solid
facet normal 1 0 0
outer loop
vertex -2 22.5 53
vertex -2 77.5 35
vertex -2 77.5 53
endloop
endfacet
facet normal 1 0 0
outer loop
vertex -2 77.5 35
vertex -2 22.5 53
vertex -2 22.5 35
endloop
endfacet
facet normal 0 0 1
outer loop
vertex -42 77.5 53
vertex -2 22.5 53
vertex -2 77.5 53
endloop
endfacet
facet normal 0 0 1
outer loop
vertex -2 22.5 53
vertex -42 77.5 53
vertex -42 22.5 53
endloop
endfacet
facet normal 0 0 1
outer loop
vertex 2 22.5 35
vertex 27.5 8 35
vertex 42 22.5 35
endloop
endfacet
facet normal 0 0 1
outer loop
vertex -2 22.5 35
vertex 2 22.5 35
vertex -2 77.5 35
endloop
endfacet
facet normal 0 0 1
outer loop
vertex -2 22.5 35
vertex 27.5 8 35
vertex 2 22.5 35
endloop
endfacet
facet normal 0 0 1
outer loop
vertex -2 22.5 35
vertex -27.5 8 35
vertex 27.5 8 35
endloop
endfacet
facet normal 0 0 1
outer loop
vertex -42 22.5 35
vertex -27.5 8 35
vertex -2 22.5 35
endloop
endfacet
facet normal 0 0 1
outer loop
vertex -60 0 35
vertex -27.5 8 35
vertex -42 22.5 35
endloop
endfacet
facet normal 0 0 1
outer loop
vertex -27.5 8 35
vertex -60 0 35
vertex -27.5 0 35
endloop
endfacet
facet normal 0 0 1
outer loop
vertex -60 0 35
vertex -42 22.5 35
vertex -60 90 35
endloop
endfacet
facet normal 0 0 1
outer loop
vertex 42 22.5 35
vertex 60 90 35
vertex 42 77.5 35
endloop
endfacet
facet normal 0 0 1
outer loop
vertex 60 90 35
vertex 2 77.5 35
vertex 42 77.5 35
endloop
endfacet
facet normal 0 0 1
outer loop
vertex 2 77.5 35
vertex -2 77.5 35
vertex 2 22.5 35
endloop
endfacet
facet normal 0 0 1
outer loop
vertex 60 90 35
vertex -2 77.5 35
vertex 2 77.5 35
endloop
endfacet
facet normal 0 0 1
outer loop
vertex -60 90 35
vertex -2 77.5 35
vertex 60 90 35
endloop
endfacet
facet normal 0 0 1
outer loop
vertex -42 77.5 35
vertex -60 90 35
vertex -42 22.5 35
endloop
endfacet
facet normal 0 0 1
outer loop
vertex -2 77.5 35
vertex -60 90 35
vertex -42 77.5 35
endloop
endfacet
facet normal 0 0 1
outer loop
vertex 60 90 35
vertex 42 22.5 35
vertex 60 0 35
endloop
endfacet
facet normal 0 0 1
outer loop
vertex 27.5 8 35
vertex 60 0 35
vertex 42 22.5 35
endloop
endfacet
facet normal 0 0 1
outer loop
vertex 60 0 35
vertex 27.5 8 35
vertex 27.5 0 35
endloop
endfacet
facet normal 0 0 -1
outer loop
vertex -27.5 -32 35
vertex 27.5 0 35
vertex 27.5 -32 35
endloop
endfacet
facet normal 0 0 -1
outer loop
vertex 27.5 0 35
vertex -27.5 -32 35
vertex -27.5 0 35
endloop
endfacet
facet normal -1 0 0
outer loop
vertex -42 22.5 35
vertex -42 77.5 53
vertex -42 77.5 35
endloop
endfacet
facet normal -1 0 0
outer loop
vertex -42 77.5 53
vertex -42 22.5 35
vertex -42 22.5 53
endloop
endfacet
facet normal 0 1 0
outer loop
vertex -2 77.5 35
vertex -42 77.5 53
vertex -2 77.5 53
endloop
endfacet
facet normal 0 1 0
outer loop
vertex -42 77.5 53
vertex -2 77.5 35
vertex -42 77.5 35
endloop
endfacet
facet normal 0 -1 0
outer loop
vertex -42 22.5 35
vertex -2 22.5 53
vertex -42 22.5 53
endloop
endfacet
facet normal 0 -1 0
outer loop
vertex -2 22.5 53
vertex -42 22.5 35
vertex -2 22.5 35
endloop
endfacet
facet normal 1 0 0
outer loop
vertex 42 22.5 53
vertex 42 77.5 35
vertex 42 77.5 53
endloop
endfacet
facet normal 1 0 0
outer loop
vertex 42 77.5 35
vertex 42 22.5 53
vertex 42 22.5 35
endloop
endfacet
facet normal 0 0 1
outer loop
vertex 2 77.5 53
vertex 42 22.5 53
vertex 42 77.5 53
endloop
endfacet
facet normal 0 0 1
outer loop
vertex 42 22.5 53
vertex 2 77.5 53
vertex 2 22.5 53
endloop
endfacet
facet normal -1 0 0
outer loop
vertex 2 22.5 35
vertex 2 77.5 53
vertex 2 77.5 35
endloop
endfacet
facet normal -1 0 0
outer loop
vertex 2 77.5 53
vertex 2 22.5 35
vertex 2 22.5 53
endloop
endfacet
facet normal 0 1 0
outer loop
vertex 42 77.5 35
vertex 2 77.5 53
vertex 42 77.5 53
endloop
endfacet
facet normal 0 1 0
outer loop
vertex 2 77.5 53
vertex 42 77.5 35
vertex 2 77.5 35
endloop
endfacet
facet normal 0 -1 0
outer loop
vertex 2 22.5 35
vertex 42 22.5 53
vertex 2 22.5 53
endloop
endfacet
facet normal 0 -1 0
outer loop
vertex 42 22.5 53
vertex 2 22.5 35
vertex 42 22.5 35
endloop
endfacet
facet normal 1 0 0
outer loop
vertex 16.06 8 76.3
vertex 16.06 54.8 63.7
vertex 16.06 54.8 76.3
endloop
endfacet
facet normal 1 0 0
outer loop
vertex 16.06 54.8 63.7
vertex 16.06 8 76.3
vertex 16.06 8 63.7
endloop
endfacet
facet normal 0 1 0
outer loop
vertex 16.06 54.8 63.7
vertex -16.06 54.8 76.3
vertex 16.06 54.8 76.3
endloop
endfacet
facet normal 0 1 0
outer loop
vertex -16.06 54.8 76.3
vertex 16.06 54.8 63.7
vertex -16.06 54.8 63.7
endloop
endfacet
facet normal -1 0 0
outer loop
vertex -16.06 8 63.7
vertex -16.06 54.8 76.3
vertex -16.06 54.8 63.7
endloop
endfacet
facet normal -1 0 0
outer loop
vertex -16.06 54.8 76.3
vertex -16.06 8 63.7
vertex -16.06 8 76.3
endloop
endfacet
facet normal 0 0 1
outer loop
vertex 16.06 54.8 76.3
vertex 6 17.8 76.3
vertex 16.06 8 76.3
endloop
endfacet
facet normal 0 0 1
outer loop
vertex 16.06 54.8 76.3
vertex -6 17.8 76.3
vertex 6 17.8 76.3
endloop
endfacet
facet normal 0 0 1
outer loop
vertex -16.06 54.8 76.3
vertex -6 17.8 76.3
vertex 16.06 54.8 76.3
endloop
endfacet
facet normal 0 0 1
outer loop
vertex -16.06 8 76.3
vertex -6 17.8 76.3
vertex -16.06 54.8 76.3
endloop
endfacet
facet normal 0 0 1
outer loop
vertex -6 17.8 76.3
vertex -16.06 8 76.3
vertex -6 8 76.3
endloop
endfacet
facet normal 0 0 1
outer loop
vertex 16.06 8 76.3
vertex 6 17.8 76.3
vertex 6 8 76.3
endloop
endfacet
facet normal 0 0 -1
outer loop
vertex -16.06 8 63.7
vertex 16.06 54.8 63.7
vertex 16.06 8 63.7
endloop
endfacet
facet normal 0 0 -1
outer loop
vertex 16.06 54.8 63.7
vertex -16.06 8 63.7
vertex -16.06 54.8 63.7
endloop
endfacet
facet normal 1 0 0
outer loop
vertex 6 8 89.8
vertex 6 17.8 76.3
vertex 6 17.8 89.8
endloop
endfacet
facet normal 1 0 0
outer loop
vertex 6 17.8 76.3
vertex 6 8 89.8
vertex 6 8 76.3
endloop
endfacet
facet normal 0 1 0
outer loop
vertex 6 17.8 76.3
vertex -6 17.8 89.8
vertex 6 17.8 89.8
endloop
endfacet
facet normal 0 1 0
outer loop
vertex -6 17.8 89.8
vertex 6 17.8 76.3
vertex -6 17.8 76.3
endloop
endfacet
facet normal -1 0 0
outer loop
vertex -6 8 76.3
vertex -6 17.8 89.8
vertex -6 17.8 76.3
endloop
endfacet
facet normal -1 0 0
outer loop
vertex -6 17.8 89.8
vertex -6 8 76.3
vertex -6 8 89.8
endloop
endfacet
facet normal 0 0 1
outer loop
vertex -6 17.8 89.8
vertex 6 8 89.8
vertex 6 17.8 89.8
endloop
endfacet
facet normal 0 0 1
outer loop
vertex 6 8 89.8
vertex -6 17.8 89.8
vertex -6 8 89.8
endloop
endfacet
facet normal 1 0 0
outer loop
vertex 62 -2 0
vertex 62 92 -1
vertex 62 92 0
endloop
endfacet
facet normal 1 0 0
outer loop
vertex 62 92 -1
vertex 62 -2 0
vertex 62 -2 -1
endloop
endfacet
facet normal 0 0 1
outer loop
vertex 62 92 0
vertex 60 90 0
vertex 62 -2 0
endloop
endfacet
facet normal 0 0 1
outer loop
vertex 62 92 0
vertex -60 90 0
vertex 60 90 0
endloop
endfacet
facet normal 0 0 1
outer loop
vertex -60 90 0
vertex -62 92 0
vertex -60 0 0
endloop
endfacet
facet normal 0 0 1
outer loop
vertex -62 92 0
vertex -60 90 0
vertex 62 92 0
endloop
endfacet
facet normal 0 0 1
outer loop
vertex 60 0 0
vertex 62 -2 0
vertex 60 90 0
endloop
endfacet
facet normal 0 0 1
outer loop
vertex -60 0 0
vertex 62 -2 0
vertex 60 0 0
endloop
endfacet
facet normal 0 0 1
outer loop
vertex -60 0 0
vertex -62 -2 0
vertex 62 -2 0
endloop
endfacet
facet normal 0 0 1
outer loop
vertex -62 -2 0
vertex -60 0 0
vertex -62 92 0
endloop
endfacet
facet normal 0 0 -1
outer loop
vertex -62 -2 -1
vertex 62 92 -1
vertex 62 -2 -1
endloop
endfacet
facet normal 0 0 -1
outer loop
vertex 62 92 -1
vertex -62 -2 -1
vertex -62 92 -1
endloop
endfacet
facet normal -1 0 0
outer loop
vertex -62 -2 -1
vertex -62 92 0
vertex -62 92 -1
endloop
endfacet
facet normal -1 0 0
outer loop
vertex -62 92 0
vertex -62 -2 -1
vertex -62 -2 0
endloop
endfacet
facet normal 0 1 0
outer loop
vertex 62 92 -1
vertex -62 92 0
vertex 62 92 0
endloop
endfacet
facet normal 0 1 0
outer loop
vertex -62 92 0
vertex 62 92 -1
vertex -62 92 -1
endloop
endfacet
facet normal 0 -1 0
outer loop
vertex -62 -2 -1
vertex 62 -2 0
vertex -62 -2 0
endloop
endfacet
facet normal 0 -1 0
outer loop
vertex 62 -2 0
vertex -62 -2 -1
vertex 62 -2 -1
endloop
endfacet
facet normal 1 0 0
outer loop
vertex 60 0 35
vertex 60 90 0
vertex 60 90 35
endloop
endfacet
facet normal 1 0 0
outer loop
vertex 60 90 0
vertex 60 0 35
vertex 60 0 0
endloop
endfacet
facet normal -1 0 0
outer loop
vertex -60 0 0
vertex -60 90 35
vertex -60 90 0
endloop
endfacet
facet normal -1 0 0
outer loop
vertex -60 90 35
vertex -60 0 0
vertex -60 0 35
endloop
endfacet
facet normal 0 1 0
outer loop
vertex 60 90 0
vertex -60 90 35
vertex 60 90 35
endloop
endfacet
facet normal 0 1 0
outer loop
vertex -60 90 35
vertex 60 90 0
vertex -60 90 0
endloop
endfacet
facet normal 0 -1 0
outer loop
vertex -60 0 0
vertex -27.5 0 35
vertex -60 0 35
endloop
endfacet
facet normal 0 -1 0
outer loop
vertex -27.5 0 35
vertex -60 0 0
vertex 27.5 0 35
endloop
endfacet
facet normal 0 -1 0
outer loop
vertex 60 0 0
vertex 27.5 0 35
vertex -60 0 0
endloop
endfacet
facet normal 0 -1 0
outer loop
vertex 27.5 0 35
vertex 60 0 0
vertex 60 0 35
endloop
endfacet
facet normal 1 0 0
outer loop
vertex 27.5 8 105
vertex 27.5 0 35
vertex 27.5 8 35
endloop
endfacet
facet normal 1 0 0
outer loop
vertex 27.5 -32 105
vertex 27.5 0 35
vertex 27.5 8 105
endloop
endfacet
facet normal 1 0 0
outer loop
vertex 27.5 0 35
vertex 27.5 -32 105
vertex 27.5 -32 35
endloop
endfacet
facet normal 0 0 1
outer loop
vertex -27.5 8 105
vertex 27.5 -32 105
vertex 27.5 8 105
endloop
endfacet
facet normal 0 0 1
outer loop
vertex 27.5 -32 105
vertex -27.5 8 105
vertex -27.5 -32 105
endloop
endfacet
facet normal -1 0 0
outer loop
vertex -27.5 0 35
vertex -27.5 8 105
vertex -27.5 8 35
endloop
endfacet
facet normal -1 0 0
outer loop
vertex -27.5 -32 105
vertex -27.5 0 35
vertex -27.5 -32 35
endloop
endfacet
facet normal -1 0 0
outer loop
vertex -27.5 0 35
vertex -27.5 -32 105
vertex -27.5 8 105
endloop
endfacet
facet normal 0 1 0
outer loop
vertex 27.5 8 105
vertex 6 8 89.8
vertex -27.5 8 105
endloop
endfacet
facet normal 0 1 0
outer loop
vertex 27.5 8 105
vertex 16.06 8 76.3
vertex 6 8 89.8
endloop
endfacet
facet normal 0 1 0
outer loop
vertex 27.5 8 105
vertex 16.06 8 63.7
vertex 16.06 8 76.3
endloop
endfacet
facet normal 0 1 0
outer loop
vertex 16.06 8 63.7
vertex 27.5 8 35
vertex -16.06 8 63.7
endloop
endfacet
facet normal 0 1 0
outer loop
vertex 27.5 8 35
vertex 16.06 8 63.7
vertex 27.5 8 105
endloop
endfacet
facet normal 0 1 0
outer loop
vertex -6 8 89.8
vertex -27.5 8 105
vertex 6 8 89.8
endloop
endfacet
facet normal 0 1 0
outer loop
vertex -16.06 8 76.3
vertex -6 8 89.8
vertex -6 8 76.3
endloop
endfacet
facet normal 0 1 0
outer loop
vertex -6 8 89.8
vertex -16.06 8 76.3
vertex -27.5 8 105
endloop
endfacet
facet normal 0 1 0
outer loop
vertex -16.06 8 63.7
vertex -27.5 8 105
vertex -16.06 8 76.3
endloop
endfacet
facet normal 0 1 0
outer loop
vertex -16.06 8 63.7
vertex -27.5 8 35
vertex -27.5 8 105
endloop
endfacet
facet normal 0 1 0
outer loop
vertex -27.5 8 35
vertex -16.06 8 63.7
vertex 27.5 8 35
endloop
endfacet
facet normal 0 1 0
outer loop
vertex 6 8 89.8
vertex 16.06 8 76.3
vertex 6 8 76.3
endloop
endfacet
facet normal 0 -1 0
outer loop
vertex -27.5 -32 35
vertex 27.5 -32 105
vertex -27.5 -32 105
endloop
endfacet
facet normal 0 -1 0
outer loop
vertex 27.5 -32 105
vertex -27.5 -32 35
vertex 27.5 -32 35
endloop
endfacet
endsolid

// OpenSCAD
// ESP][ mechanical skeleton — NON-STYLED layout / collision study only.
// NOT the final enclosure. No fillets, vents, keycaps, logos, or drive art.
//
// Units: millimetres. Coordinate system: see dimensions/coordinate-system.json
//   X = left→right, Y = front→rear, Z = bottom→top
//
// Open in OpenSCAD (or any SCAD→STEP toolchain). Values marked PROVISIONAL
// must not be treated as frozen product dimensions.

$fn = 24;

/* ---- OFFICIAL Waveshare display params (board.json / display-geometry.json) ---- */
oled_physical_width  = 26.74;
oled_physical_height = 41.62;
oled_physical_r      = 3.7;

oled_active_width  = 22.34;
oled_active_height = 36.06;
oled_upper_radius  = 2.5;
oled_active_offset_x = 2.2;
oled_active_offset_y = 2.28; // from glass top

/* PROVISIONAL_CAD_CANDIDATE visible window */
monitor_visible_width  = 22.34;
monitor_visible_height = 33.56; // 36.06 - 2.50
bezel_overlap_top = 2.5;

/* Module envelope (OFFICIAL outline — not STEP AABB) */
module_w = 29.12;
module_h = 44.0;
module_t = 9.6;

/* ---- PROVISIONAL miniature enclosure volumes (layout only) ---- */
computer_w = 120;
computer_d = 90;
computer_h = 35;

monitor_w = 55;
monitor_d = 40;
monitor_h = 70;

drive_w = 40;
drive_d = 55;
drive_h = 18;

keyboard_zone_h = 8;

module rounded_rect_2d(w, h, r) {
  offset(r = r) offset(delta = -r) square([w, h], center = true);
}

module display_glass_physical() {
  color([0.7, 0.85, 1.0, 0.35])
    linear_extrude(height = 0.8)
      rounded_rect_2d(oled_physical_width, oled_physical_height, oled_physical_r);
}

module display_active_area() {
  // Upper-only rounding approximated with full rounded rect for visualization.
  color([0.2, 0.9, 0.3, 0.45])
    translate([0, -(oled_physical_height - oled_active_height) / 2 + oled_active_offset_y
                 - (oled_physical_height / 2 - oled_active_height / 2), 0.9])
      linear_extrude(height = 0.4)
        rounded_rect_2d(oled_active_width, oled_active_height, oled_upper_radius);
}

module display_visible_window() {
  color([1, 0.2, 0.2, 0.55])
    translate([0,
      -(oled_physical_height / 2)
        + oled_active_offset_y
        + bezel_overlap_top
        + monitor_visible_height / 2,
      1.4])
      linear_extrude(height = 0.3)
        square([monitor_visible_width, monitor_visible_height], center = true);
}

module waveshare_module_envelope() {
  // Axis-aligned stand-in for official outline (STEP imported separately).
  color([0.3, 0.3, 0.35, 0.5])
    cube([module_w, module_t, module_h], center = true);
}

module board_insertion_envelope() {
  // Clearance volume for +Z insertion from below — PROVISIONAL padding.
  pad = 1.5;
  color([1, 0.6, 0, 0.2])
    translate([0, 0, -module_h / 2 - 8])
      cube([module_w + 2 * pad, module_t + 2 * pad, module_h + 16], center = true);
}

module usb_path_keepout() {
  // PENDING_COMPONENT_SELECTION — placeholder only.
  color([0.2, 0.5, 1, 0.25])
    translate([0, module_t / 2 + 6, -module_h / 2 + 4])
      cube([12, 18, 10], center = true);
}

module approx_computer_volume() {
  color([0.93, 0.86, 0.7, 0.25])
    translate([0, computer_d / 2, computer_h / 2])
      cube([computer_w, computer_d, computer_h], center = true);
}

module approx_monitor_volume() {
  color([0.93, 0.86, 0.7, 0.3])
    translate([0, -monitor_d / 2 + 8, computer_h + monitor_h / 2])
      cube([monitor_w, monitor_d, monitor_h], center = true);
}

module approx_drive_volumes() {
  color([0.93, 0.86, 0.7, 0.28]) {
    translate([-drive_w / 2 - 2, computer_d / 2 + 5, computer_h + drive_h / 2])
      cube([drive_w, drive_d, drive_h], center = true);
    translate([drive_w / 2 + 2, computer_d / 2 + 5, computer_h + drive_h / 2])
      cube([drive_w, drive_d, drive_h], center = true);
  }
}

module bottom_plane() {
  color([0.55, 0.55, 0.55, 0.4])
    translate([0, computer_d / 2, -0.5])
      cube([computer_w + 4, computer_d + 4, 1], center = true);
}

module keyboard_zone() {
  color([0.45, 0.28, 0.15, 0.35])
    translate([0, 25, keyboard_zone_h / 2 + 1])
      cube([computer_w - 10, 50, keyboard_zone_h], center = true);
}

module rear_io_zone() {
  color([0.4, 0.4, 0.45, 0.35])
    translate([0, computer_d - 4, 12])
      cube([computer_w - 20, 8, 20], center = true);
}

/* Board + display stack placed in monitor (portrait) */
module board_stack_in_monitor() {
  translate([0, -monitor_d / 2 + 8 + module_t / 2 + 2, computer_h + monitor_h / 2]) {
    rotate([90, 0, 0]) {
      waveshare_module_envelope();
      board_insertion_envelope();
      translate([0, -module_t / 2 - 0.5, 0]) {
        rotate([-90, 0, 0]) {
          // Glass facing −Y (toward user) after outer rotate — visualized flat here.
        }
      }
      usb_path_keepout();
    }
    // Display planes facing user (−Y)
    translate([0, -module_t / 2 - 1, 0])
      rotate([90, 0, 0]) {
        display_glass_physical();
        display_active_area();
        display_visible_window();
      }
  }
}

bottom_plane();
approx_computer_volume();
approx_monitor_volume();
approx_drive_volumes();
keyboard_zone();
rear_io_zone();
board_stack_in_monitor();
